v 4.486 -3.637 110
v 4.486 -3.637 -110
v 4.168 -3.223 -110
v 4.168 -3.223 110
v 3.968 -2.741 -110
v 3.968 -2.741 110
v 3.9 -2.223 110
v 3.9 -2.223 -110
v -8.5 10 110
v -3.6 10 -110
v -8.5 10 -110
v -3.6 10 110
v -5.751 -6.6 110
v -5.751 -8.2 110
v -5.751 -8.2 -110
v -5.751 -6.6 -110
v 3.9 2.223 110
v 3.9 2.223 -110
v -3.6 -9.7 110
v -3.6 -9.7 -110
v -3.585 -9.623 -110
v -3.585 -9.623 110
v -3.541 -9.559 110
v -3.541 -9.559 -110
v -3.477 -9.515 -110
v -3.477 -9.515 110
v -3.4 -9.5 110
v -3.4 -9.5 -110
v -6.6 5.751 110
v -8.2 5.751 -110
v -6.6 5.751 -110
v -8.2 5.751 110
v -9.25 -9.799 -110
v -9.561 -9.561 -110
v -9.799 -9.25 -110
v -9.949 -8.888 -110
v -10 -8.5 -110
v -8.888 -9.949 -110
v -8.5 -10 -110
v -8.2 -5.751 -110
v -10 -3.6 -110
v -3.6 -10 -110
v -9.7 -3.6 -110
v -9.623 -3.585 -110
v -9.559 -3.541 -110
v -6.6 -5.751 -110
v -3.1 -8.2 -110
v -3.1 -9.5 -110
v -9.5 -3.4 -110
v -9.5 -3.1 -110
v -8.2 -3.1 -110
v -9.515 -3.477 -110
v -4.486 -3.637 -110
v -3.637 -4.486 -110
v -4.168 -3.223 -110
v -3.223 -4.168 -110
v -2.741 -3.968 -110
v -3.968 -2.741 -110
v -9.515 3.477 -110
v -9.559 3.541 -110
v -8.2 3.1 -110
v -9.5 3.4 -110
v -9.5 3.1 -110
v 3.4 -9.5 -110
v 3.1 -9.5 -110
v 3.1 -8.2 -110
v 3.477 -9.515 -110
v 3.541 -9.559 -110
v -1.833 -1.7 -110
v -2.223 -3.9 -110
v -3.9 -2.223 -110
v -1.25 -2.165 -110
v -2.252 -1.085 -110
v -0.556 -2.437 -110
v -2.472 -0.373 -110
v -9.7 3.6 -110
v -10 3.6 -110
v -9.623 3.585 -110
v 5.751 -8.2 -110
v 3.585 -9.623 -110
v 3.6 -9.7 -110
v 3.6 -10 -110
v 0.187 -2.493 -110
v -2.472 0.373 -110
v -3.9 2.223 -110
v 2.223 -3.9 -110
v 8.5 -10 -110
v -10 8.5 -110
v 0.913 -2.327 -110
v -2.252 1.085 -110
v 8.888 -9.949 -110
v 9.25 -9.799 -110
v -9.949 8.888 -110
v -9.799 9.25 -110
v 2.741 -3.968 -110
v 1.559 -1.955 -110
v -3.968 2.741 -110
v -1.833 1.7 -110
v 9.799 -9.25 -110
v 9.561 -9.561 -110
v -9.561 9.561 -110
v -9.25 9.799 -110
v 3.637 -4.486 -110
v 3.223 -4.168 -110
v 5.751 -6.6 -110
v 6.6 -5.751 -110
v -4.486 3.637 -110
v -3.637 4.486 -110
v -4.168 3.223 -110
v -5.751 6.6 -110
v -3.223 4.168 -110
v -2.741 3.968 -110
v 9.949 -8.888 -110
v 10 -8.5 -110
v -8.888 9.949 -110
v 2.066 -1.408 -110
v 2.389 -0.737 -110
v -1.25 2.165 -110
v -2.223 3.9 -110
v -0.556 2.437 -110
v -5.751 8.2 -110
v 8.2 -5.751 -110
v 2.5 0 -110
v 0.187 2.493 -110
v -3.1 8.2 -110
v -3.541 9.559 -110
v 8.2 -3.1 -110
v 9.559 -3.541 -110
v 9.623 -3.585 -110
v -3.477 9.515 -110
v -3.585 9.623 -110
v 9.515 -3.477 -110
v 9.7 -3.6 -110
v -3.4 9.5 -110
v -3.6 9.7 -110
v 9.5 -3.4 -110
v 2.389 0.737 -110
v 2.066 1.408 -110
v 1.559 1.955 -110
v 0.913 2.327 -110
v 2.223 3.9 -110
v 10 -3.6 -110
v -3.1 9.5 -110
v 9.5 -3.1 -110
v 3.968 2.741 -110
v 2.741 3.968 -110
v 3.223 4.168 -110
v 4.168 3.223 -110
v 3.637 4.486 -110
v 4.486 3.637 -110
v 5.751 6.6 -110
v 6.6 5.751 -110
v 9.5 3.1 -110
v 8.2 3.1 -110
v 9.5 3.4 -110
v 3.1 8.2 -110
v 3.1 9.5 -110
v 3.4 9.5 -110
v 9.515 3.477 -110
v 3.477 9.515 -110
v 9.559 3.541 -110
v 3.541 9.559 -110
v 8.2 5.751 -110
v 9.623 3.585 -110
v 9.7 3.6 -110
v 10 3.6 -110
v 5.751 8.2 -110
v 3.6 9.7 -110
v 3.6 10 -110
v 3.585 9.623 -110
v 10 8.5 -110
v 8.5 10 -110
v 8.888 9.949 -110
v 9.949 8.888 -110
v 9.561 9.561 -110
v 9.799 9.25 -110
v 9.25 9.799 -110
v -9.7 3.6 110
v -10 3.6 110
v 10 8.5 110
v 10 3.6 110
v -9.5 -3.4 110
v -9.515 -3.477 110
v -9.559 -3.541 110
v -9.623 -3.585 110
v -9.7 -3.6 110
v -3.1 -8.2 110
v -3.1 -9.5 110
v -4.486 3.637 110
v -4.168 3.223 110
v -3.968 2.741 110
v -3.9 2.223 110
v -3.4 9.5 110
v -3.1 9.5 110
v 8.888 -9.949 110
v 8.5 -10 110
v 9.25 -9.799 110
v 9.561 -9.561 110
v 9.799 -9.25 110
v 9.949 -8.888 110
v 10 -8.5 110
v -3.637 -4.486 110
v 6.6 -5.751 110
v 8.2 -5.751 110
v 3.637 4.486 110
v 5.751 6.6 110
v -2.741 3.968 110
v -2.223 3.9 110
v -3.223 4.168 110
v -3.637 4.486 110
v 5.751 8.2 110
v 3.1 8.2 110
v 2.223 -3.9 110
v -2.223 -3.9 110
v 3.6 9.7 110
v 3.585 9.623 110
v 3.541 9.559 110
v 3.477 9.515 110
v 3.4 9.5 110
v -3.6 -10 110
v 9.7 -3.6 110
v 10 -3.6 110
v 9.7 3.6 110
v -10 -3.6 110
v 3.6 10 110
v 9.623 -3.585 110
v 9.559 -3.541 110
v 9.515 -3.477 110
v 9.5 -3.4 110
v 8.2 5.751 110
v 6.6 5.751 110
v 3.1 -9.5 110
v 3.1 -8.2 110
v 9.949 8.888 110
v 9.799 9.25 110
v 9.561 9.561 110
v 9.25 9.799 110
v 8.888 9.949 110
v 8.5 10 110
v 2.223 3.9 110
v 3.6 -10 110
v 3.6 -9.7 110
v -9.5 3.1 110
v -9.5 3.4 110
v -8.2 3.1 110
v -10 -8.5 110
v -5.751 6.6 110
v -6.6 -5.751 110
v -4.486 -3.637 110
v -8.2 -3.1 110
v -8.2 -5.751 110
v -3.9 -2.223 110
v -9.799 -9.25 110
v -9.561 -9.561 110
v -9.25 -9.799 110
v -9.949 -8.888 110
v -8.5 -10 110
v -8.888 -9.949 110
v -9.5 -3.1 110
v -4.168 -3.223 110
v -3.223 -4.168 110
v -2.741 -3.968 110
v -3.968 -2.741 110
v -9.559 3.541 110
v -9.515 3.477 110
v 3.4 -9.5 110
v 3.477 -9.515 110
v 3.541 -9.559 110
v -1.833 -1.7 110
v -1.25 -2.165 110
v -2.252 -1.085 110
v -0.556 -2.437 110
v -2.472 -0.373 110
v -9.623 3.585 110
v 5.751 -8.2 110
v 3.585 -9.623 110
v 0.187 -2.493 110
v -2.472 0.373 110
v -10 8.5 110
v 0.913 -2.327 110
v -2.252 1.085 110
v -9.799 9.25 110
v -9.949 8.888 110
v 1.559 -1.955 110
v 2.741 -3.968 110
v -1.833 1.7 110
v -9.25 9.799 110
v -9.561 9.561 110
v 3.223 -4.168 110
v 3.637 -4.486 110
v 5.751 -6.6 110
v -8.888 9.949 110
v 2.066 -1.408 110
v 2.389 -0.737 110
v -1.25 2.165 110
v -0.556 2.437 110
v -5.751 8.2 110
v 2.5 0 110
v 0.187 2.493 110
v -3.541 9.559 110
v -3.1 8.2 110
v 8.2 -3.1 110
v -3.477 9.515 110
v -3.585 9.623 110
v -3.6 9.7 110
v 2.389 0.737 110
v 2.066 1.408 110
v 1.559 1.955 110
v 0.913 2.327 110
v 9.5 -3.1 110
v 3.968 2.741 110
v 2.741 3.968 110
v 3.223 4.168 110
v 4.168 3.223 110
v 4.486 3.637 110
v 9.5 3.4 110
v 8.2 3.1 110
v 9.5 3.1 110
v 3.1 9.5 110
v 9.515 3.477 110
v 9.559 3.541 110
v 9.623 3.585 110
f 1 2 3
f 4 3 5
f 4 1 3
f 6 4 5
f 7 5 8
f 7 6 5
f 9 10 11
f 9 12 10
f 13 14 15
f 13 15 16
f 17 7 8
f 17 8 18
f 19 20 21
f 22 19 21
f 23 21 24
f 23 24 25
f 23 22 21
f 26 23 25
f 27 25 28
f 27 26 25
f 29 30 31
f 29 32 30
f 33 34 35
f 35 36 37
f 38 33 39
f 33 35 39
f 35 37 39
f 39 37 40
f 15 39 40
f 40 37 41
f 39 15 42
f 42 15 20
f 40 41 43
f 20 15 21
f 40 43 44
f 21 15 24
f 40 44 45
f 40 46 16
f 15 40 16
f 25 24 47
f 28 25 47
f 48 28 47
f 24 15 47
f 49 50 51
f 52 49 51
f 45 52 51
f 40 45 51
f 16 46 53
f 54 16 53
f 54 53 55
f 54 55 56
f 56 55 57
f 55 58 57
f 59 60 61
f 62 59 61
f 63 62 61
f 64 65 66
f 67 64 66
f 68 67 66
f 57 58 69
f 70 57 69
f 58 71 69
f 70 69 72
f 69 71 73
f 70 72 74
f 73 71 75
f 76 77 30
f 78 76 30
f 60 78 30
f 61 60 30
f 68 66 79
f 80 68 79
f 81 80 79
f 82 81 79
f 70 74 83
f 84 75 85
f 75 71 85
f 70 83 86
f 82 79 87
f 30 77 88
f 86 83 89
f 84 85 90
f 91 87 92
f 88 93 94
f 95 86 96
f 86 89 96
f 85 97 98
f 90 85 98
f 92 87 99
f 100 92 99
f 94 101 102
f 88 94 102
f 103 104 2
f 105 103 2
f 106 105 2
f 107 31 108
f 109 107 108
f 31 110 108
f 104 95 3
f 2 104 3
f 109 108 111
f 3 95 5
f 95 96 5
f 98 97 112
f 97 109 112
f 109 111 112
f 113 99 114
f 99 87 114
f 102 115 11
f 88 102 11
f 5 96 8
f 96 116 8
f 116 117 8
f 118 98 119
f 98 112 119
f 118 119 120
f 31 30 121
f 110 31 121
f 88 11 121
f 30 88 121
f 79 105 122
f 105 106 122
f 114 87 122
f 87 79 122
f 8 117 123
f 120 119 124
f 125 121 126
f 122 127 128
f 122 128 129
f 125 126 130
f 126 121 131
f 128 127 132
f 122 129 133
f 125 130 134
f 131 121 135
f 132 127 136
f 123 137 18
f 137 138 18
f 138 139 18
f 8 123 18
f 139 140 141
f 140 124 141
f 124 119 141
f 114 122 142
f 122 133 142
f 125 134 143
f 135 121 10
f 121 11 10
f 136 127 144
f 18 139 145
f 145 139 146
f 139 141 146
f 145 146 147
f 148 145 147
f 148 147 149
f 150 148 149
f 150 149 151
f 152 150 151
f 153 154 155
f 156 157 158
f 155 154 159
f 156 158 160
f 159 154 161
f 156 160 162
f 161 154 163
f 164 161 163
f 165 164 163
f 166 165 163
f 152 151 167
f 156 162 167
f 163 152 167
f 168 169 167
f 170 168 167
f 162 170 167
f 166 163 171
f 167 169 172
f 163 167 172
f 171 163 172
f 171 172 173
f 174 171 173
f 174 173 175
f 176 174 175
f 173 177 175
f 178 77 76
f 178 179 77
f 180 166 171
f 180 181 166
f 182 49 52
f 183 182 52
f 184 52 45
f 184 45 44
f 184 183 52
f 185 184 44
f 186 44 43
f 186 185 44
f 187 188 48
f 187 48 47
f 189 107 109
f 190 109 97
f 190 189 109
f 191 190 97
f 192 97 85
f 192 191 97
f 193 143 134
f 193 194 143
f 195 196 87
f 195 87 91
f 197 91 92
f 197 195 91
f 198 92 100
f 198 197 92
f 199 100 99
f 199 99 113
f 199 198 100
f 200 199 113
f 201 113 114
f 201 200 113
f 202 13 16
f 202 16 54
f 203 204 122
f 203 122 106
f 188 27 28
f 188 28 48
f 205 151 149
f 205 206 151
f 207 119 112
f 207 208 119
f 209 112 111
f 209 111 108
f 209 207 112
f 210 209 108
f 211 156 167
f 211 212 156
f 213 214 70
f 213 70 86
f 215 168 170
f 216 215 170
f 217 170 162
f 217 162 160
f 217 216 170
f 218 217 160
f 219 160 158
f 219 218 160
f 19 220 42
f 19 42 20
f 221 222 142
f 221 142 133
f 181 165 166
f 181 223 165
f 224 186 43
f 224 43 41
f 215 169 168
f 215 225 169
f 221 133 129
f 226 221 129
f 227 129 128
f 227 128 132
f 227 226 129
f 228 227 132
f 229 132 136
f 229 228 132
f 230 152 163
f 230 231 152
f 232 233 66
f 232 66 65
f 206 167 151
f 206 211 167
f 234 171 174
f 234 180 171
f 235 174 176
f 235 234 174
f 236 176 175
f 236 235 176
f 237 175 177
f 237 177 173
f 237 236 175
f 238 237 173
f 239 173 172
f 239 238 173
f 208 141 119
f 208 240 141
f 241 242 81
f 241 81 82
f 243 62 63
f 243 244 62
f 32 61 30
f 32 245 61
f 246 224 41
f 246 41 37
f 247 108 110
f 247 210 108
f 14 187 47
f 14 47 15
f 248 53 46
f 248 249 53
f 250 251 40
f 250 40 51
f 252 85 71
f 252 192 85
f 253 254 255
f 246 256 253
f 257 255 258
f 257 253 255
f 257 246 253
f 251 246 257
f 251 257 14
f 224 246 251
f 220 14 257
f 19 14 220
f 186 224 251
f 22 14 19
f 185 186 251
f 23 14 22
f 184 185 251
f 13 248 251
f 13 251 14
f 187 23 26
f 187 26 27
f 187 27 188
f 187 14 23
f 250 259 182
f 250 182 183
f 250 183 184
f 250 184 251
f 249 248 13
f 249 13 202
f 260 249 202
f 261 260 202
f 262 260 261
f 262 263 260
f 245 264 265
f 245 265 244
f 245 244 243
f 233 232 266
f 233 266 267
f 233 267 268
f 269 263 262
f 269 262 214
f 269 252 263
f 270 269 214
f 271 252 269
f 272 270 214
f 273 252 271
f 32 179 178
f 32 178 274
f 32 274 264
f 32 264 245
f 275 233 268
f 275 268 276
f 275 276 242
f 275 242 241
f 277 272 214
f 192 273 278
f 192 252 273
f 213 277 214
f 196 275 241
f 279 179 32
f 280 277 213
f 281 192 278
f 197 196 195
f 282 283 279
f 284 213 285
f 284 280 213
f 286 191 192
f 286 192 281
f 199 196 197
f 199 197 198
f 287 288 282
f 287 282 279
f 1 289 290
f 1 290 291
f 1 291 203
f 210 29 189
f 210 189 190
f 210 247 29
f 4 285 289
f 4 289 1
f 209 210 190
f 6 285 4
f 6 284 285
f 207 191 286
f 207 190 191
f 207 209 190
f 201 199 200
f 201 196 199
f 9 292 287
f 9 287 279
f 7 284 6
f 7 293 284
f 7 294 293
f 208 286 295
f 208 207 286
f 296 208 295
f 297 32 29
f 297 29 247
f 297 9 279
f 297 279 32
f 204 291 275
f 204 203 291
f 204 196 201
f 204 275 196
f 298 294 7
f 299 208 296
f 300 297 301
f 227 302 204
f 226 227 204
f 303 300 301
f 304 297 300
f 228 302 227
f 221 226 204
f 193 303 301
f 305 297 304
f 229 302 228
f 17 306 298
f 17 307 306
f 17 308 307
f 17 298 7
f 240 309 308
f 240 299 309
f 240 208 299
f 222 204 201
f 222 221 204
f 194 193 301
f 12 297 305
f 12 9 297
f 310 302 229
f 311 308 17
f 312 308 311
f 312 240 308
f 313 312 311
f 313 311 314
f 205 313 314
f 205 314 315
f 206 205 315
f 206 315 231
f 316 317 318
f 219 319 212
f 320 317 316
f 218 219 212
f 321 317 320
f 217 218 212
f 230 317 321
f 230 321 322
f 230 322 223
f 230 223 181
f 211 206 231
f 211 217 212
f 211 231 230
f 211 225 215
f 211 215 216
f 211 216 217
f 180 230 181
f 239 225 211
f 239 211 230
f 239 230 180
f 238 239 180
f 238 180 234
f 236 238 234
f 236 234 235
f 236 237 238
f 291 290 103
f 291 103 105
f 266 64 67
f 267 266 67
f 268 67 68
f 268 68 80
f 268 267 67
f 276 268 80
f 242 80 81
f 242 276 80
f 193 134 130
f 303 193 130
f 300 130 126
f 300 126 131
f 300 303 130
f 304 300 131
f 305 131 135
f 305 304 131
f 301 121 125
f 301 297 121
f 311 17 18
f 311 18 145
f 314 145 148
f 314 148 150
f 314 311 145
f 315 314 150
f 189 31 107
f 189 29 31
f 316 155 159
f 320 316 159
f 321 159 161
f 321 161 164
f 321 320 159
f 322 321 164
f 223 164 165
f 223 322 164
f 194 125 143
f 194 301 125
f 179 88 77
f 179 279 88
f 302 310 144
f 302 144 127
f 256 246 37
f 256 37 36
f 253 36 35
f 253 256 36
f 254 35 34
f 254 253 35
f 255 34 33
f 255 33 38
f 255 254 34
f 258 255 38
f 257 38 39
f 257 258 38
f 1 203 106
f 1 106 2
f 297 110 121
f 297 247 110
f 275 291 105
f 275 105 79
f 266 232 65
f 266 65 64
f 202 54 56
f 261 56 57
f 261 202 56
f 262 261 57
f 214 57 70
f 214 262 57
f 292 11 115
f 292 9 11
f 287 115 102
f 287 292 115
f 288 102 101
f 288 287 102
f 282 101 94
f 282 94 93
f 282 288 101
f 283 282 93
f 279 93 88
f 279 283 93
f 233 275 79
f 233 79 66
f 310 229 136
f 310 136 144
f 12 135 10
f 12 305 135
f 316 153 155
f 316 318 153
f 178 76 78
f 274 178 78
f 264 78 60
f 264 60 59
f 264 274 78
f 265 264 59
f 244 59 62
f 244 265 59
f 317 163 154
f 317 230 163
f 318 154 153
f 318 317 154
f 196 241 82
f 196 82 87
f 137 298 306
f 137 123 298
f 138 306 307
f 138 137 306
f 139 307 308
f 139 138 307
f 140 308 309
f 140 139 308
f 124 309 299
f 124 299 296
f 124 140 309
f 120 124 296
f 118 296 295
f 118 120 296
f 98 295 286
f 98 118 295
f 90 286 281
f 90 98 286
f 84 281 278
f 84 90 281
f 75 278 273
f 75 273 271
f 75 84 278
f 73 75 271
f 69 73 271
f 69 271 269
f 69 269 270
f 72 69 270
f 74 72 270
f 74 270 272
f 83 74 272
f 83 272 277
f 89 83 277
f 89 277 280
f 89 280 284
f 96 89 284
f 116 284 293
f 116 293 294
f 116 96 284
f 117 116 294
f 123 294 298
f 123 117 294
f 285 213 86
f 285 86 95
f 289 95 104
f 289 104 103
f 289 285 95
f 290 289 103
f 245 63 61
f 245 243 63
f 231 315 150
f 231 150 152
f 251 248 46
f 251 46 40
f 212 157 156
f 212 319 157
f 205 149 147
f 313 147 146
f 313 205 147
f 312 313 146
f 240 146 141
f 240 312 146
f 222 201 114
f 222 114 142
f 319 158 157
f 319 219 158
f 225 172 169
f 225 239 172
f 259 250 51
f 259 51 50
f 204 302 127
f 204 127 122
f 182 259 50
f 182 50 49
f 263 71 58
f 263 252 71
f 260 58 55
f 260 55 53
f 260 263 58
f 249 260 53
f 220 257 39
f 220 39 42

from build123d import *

# Parameters (mm, degrees)
CROQUIS1_R              = 2.5
SALIENTE_EXTRUIR1_DEPTH = 110


with BuildPart() as part:
    # Croquis1 → Saliente-Extruir1 (new, symmetric)
    with BuildSketch(Plane.XY):
        with BuildLine():
            Line((-4.485786438, -3.6372583), (-6.6, -5.751471863))
            Line((-6.6, -5.751471863), (-8.2, -5.751471863))
            Line((-8.2, -5.751471863), (-8.2, -3.1))
            Line((-8.2, -3.1), (-9.5, -3.1))
            Line((-9.5, -3.1), (-9.5, -3.4))
            ThreePointArc((-9.5, -3.4), (-9.558578644, -3.541421356), (-9.7, -3.6))
            Line((-9.7, -3.6), (-10, -3.6))
            Line((-10, -3.6), (-10, -8.5))
            ThreePointArc((-10, -8.5), (-9.560660172, -9.560660172), (-8.5, -10))
            Line((-8.5, -10), (-3.6, -10))
            Line((-3.6, -10), (-3.6, -9.7))
            ThreePointArc((-3.6, -9.7), (-3.541421356, -9.558578644), (-3.4, -9.5))
            Line((-3.4, -9.5), (-3.1, -9.5))
            Line((-3.1, -9.5), (-3.1, -8.2))
            Line((-3.1, -8.2), (-5.751471863, -8.2))
            Line((-5.751471863, -8.2), (-5.751471863, -6.6))
            Line((-5.751471863, -6.6), (-3.6372583, -4.485786438))
            ThreePointArc((-3.6372583, -4.485786438), (-2.988411603, -4.052240935), (-2.223044738, -3.9))
            Line((-2.223044738, -3.9), (2.223044738, -3.9))
            ThreePointArc((2.223044738, -3.9), (2.988411603, -4.052240935), (3.6372583, -4.485786438))
            Line((3.6372583, -4.485786438), (5.751471863, -6.6))
            Line((5.751471863, -6.6), (5.751471863, -8.2))
            Line((5.751471863, -8.2), (3.1, -8.2))
            Line((3.1, -8.2), (3.1, -9.5))
            Line((3.1, -9.5), (3.4, -9.5))
            ThreePointArc((3.4, -9.5), (3.541421356, -9.558578644), (3.6, -9.7))
            Line((3.6, -9.7), (3.6, -10))
            Line((3.6, -10), (8.5, -10))
            ThreePointArc((8.5, -10), (9.560660172, -9.560660172), (10, -8.5))
            Line((10, -8.5), (10, -3.6))
            Line((10, -3.6), (9.7, -3.6))
            ThreePointArc((9.7, -3.6), (9.558578644, -3.541421356), (9.5, -3.4))
            Line((9.5, -3.4), (9.5, -3.1))
            Line((9.5, -3.1), (8.2, -3.1))
            Line((8.2, -3.1), (8.2, -5.751471863))
            Line((8.2, -5.751471863), (6.6, -5.751471863))
            Line((6.6, -5.751471863), (4.485786438, -3.6372583))
            ThreePointArc((4.485786438, -3.6372583), (4.052240935, -2.988411603), (3.9, -2.223044738))
            Line((3.9, -2.223044738), (3.9, 2.223044738))
            ThreePointArc((3.9, 2.223044738), (4.052240935, 2.988411603), (4.485786438, 3.6372583))
            Line((4.485786438, 3.6372583), (6.6, 5.751471863))
            Line((6.6, 5.751471863), (8.2, 5.751471863))
            Line((8.2, 5.751471863), (8.2, 3.1))
            Line((8.2, 3.1), (9.5, 3.1))
            Line((9.5, 3.1), (9.5, 3.4))
            ThreePointArc((9.5, 3.4), (9.558578644, 3.541421356), (9.7, 3.6))
            Line((9.7, 3.6), (10, 3.6))
            Line((10, 3.6), (10, 8.5))
            ThreePointArc((10, 8.5), (9.560660172, 9.560660172), (8.5, 10))
            Line((8.5, 10), (3.6, 10))
            Line((3.6, 10), (3.6, 9.7))
            ThreePointArc((3.6, 9.7), (3.541421356, 9.558578644), (3.4, 9.5))
            Line((3.4, 9.5), (3.1, 9.5))
            Line((3.1, 9.5), (3.1, 8.2))
            Line((3.1, 8.2), (5.751471863, 8.2))
            Line((5.751471863, 8.2), (5.751471863, 6.6))
            Line((5.751471863, 6.6), (3.6372583, 4.485786438))
            ThreePointArc((3.6372583, 4.485786438), (2.988411603, 4.052240935), (2.223044738, 3.9))
            Line((2.223044738, 3.9), (-2.223044738, 3.9))
            ThreePointArc((-2.223044738, 3.9), (-2.988411603, 4.052240935), (-3.6372583, 4.485786438))
            Line((-3.6372583, 4.485786438), (-5.751471863, 6.6))
            Line((-5.751471863, 6.6), (-5.751471863, 8.2))
            Line((-5.751471863, 8.2), (-3.1, 8.2))
            Line((-3.1, 8.2), (-3.1, 9.5))
            Line((-3.1, 9.5), (-3.4, 9.5))
            ThreePointArc((-3.4, 9.5), (-3.541421356, 9.558578644), (-3.6, 9.7))
            Line((-3.6, 9.7), (-3.6, 10))
            Line((-3.6, 10), (-8.5, 10))
            ThreePointArc((-8.5, 10), (-9.560660172, 9.560660172), (-10, 8.5))
            Line((-10, 8.5), (-10, 3.6))
            Line((-10, 3.6), (-9.7, 3.6))
            ThreePointArc((-9.7, 3.6), (-9.558578644, 3.541421356), (-9.5, 3.4))
            Line((-9.5, 3.4), (-9.5, 3.1))
            Line((-9.5, 3.1), (-8.2, 3.1))
            Line((-8.2, 3.1), (-8.2, 5.751471863))
            Line((-8.2, 5.751471863), (-6.6, 5.751471863))
            Line((-6.6, 5.751471863), (-4.485786438, 3.6372583))
            ThreePointArc((-4.485786438, 3.6372583), (-4.052240935, 2.988411603), (-3.9, 2.223044738))
            Line((-3.9, 2.223044738), (-3.9, -2.223044738))
            ThreePointArc((-3.9, -2.223044738), (-4.052240935, -2.988411603), (-4.485786438, -3.6372583))
        make_face()
        Circle(CROQUIS1_R, mode=Mode.SUBTRACT)
    extrude(amount=SALIENTE_EXTRUIR1_DEPTH, both=True)


solid = part.part
